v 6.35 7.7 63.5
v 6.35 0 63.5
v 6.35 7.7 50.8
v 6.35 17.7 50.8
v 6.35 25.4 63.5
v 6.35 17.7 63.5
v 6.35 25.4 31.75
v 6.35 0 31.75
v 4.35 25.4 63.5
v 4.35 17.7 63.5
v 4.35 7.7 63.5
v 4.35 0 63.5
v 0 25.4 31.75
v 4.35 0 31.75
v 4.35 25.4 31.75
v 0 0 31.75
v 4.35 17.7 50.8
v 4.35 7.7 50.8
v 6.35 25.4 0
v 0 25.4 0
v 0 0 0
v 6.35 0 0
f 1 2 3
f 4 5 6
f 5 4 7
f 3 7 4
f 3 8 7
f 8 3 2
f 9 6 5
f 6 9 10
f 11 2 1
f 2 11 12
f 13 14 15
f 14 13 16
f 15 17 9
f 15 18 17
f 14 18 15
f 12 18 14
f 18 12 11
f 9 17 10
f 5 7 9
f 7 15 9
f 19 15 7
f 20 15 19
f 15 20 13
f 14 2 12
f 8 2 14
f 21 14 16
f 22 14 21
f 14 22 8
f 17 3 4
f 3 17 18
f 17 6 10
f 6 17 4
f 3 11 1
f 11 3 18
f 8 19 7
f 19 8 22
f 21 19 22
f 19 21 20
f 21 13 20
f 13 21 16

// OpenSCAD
screw_guide=10;
brace_lock_down_y=25.4;
brace_lock_down_x=25.4*.25;
brace_lock_down_z=25.4*1.25;


latch_x=2;
latch_z=25.4*1.25;

cube([brace_lock_down_x, brace_lock_down_y, brace_lock_down_z]);
translate([brace_lock_down_x-2,0,brace_lock_down_z]){
    difference(){
        color("green")
        cube([latch_x, brace_lock_down_y, latch_z]);
        
        translate([-1,brace_lock_down_y/2 - screw_guide/2, latch_z - 25.4*.5])
        color("red")
        cube([latch_x+2, screw_guide, 25.4*.5+1]);
    }

}
